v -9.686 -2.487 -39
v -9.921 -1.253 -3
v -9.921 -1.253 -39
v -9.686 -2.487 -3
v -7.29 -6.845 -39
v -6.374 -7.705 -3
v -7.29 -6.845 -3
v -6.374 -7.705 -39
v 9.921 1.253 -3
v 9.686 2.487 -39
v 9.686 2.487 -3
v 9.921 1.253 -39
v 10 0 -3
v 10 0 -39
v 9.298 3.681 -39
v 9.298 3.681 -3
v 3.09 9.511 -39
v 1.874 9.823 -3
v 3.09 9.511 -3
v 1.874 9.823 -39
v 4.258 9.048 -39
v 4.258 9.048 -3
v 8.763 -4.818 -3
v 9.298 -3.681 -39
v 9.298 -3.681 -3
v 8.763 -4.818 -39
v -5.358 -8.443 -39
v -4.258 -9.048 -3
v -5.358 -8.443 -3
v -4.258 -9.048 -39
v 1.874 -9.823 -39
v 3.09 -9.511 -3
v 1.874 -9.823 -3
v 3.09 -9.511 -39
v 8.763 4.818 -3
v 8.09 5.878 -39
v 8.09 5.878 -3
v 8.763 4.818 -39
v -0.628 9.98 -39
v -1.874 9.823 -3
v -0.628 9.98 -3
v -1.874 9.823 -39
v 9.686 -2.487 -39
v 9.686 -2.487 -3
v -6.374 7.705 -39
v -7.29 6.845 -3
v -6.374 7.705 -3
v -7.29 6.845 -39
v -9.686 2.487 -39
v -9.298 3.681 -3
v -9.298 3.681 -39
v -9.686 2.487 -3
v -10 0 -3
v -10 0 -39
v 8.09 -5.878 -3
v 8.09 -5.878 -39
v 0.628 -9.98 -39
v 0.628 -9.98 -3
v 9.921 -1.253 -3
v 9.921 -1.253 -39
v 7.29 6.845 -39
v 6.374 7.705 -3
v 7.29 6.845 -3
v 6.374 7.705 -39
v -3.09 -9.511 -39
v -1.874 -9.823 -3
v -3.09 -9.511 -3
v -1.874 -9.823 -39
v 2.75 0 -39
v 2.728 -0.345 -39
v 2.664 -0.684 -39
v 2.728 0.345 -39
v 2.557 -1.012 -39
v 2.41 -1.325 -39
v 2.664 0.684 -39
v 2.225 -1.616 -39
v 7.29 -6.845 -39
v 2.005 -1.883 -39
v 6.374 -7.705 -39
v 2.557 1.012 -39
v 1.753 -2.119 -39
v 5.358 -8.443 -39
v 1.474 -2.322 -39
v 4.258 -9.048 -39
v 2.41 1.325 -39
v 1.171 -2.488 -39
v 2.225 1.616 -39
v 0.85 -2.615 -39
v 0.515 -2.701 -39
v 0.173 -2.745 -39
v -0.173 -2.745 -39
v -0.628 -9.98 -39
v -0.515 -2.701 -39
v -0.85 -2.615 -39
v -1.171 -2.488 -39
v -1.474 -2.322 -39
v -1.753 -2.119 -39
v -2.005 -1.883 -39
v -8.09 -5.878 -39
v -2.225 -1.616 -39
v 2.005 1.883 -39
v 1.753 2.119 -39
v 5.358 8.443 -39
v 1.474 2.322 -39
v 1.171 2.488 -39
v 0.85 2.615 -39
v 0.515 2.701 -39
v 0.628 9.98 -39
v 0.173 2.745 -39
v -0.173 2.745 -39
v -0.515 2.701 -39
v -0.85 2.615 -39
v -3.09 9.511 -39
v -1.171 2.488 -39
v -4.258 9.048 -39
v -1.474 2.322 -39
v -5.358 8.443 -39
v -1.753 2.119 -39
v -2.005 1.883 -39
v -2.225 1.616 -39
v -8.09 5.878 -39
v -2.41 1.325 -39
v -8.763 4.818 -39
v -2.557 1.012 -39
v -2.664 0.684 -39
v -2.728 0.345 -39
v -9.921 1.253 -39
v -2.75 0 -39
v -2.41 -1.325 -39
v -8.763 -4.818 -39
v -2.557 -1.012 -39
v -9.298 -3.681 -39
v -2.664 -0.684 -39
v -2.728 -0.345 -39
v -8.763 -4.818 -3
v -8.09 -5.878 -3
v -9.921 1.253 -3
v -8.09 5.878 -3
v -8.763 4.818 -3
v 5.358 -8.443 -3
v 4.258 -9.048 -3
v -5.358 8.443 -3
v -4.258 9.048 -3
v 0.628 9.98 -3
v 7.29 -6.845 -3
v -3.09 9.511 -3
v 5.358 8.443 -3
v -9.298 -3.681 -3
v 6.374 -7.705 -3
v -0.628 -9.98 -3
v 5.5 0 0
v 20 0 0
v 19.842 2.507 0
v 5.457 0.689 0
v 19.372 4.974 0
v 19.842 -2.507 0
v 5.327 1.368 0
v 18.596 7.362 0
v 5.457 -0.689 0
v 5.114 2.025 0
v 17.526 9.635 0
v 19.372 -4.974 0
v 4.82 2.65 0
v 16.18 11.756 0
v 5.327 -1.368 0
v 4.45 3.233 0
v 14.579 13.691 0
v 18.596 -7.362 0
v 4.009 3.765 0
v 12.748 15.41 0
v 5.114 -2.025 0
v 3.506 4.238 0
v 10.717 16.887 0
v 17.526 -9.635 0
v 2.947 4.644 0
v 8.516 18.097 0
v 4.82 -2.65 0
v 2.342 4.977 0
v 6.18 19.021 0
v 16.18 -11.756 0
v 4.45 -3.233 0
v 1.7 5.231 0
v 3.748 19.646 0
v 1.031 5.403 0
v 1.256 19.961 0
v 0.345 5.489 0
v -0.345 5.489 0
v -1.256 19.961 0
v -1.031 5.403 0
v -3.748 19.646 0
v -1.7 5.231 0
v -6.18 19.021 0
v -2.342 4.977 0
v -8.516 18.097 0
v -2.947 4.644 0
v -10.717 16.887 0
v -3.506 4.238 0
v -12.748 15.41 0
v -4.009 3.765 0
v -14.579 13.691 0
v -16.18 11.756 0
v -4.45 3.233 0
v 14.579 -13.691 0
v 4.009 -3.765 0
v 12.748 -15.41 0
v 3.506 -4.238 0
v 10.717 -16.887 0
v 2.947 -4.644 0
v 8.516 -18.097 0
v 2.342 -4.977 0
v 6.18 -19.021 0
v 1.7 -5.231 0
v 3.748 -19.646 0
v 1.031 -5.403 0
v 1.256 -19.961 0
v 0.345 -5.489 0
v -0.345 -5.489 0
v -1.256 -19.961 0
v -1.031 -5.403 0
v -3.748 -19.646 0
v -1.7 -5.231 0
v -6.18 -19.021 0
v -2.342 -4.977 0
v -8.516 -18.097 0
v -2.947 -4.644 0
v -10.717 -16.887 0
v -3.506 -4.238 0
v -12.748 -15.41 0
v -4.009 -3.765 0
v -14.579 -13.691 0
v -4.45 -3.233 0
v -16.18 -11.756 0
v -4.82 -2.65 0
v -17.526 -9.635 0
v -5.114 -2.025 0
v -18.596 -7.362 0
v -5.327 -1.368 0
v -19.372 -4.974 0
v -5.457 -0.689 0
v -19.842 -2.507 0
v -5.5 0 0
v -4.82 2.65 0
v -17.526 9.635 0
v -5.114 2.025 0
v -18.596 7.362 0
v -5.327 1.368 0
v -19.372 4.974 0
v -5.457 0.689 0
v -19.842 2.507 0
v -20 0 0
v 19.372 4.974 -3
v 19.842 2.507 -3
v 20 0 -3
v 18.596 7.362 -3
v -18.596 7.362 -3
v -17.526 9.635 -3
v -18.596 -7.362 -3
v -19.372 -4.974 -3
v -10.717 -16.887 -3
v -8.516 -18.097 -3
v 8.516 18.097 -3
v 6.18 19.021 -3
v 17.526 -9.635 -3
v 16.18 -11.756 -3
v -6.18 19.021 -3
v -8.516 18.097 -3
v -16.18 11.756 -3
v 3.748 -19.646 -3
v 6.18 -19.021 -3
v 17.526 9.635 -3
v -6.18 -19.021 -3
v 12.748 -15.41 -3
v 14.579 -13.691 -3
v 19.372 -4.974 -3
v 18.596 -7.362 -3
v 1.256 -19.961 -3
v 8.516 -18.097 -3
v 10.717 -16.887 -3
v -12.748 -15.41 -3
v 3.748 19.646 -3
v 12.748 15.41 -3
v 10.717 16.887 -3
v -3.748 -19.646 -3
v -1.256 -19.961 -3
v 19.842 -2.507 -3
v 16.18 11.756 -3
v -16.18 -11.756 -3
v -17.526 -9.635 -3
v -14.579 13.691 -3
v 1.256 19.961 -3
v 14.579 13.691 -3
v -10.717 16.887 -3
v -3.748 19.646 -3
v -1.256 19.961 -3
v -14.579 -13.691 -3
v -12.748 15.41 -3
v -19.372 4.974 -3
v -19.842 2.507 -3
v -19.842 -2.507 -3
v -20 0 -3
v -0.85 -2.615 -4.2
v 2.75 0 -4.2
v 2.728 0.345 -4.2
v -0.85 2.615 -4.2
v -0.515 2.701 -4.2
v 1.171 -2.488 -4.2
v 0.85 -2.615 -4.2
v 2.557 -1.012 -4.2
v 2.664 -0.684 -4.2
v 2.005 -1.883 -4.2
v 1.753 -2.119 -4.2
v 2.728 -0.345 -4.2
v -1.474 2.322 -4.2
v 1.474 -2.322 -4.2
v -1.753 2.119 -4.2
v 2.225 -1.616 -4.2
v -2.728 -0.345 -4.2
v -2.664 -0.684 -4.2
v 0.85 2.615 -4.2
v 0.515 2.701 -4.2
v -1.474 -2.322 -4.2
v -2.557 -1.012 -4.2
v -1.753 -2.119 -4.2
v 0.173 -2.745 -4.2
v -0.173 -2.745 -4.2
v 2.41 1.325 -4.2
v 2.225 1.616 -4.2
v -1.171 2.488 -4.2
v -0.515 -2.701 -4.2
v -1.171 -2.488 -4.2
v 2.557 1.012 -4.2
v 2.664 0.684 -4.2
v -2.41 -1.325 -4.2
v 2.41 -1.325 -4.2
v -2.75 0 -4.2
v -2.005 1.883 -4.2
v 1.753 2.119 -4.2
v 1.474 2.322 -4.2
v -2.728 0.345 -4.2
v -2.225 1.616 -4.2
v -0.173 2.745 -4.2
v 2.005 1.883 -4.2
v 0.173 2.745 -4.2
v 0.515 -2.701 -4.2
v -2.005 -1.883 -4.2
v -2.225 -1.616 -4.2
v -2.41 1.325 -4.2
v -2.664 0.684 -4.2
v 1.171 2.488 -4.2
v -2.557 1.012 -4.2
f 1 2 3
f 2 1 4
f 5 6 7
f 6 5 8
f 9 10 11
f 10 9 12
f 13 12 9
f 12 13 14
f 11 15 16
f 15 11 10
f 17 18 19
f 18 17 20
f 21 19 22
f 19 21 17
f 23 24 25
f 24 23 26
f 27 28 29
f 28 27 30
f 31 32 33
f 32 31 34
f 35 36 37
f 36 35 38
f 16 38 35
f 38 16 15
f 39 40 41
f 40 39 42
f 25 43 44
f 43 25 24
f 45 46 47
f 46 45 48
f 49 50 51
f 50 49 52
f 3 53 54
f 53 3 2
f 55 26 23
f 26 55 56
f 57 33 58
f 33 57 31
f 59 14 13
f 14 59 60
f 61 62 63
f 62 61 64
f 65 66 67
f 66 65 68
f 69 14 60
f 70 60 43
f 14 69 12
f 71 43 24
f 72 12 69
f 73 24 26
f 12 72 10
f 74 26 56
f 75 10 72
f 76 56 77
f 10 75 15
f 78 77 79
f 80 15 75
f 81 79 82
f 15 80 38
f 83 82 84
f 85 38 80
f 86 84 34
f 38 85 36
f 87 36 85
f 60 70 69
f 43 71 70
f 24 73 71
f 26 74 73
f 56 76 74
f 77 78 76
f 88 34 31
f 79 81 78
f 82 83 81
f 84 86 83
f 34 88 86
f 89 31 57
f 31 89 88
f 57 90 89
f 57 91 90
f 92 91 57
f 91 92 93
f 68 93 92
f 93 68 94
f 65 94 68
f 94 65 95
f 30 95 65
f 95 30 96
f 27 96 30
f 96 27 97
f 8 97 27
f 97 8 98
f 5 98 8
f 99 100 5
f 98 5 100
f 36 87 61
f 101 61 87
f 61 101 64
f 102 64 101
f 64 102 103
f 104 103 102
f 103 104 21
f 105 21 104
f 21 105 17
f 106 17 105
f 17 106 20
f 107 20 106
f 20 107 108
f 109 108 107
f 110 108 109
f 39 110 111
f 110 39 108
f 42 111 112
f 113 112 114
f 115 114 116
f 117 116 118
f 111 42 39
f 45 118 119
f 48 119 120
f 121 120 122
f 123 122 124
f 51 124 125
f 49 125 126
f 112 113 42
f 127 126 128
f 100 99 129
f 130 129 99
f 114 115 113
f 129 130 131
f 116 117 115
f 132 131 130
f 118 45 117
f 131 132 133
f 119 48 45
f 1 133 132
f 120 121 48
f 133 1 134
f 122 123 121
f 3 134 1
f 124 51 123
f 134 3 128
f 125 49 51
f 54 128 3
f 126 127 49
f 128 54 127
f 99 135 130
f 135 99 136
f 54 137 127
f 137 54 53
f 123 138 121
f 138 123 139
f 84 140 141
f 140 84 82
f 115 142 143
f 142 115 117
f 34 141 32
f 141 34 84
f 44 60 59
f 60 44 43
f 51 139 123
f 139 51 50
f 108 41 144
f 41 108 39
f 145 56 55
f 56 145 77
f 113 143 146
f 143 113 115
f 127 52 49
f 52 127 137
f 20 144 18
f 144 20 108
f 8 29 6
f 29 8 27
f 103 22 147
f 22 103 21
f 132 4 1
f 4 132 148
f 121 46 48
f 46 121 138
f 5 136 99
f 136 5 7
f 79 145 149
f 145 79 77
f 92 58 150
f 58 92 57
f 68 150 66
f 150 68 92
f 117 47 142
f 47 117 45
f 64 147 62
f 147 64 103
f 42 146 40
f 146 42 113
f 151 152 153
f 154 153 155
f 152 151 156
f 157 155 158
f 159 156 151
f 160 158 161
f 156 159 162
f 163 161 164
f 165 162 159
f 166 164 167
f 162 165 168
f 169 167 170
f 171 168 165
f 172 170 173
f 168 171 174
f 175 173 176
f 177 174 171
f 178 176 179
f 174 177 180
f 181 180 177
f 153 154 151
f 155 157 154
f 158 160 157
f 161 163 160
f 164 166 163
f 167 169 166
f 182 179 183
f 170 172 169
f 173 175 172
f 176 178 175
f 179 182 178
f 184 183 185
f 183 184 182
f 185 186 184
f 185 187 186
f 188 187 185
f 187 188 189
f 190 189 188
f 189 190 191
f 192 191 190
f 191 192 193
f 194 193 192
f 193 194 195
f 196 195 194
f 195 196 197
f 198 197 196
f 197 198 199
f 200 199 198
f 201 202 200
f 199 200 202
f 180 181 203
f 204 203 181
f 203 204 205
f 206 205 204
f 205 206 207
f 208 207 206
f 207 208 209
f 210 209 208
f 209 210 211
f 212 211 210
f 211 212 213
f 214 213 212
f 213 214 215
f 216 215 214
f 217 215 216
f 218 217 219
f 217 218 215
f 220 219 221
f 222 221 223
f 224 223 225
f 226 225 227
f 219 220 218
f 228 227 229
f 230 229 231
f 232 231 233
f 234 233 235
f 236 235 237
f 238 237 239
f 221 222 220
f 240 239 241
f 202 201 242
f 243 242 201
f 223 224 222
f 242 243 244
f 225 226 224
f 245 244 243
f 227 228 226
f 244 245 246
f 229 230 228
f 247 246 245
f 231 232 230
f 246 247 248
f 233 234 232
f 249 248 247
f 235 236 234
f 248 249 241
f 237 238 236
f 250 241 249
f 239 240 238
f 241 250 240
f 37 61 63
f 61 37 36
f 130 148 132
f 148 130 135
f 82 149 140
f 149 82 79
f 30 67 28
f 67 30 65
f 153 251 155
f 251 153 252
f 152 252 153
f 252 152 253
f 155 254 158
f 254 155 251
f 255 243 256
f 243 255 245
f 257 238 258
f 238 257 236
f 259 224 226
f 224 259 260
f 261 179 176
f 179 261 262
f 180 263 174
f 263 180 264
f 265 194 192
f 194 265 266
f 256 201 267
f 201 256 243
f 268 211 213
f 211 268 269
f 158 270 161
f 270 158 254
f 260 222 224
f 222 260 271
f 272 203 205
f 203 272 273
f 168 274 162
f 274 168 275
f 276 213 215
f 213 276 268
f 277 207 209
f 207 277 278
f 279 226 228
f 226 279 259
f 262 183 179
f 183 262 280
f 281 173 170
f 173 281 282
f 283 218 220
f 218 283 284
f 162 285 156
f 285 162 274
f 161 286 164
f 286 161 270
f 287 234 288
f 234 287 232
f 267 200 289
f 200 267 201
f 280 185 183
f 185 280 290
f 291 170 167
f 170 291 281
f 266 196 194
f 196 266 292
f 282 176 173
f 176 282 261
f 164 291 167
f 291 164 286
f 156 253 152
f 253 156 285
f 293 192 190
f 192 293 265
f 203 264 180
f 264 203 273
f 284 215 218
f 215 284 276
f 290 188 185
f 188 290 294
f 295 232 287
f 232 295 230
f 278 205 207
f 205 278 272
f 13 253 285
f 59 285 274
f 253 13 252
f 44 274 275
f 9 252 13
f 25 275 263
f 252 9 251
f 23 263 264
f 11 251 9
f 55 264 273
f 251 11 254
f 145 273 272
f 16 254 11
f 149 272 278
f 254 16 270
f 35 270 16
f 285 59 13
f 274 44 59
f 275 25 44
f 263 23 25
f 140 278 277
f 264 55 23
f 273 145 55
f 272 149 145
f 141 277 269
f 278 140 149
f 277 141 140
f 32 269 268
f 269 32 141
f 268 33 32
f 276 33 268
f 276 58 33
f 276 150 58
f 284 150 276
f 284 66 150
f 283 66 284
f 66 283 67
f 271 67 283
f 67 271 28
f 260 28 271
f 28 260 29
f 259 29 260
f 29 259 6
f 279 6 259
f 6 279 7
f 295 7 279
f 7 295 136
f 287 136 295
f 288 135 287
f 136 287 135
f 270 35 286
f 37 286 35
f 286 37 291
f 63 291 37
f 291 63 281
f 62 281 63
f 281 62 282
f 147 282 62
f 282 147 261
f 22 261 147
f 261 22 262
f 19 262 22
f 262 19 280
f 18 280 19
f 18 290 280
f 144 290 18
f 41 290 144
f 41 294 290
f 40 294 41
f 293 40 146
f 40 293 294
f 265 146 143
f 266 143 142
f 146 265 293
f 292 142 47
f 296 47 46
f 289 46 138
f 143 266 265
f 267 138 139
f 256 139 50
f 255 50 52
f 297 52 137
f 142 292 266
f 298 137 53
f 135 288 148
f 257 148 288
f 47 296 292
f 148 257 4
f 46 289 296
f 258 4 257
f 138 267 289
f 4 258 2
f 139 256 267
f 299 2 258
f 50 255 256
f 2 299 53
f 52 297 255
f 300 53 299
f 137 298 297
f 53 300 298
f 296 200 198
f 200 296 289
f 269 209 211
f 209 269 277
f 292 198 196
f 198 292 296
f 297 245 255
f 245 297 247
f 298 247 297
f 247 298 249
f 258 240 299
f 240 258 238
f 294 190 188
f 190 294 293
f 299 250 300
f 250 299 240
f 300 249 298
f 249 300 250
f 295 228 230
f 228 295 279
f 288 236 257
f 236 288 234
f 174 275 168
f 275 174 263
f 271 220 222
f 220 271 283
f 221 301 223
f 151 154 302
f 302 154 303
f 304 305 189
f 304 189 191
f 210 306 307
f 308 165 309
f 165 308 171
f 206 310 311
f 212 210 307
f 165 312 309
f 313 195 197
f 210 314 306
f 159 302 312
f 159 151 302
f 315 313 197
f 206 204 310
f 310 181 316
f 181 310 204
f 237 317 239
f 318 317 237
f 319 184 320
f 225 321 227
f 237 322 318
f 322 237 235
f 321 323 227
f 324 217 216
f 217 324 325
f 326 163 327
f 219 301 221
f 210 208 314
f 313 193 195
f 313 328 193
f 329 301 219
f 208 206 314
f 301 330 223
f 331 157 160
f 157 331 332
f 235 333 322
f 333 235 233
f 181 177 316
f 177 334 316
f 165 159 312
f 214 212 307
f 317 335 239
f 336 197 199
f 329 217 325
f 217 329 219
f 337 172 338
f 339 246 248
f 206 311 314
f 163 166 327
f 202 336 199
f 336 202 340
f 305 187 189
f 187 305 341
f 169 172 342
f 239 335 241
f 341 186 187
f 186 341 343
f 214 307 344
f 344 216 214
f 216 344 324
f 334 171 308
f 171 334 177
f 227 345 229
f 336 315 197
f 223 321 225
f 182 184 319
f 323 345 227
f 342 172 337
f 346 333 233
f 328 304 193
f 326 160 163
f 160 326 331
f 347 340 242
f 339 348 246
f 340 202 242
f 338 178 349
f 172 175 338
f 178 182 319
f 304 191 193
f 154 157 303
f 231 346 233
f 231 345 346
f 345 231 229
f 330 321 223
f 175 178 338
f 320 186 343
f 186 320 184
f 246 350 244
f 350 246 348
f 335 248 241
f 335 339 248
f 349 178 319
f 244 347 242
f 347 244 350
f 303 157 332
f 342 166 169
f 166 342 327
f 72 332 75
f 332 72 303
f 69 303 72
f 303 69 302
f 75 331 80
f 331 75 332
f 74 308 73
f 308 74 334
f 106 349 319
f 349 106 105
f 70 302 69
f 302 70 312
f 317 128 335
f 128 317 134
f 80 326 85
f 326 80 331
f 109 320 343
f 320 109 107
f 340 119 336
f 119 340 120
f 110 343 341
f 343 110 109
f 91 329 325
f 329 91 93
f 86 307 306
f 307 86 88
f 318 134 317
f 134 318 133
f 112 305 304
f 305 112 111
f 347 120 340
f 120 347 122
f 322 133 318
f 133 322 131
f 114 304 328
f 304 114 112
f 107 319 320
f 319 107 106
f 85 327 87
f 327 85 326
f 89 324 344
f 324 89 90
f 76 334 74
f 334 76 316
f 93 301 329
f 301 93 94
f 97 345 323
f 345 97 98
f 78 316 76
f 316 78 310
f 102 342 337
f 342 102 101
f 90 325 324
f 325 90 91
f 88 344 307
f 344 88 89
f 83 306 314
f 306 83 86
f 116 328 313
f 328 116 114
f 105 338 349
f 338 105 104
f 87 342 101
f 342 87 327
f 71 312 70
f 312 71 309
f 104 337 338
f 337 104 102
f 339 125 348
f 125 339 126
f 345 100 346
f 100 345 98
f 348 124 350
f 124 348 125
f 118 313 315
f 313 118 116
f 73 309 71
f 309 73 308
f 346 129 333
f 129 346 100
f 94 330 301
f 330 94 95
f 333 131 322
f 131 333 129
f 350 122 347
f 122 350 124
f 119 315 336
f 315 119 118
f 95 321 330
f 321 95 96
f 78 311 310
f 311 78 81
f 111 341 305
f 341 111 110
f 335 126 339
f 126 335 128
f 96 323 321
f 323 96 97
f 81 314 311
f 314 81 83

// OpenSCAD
$fn = 50;


difference() {
	union() {
		translate(v = [0, 0, -39.0000000000]) {
			cylinder(h = 39, r = 10.0000000000);
		}
		translate(v = [0, 0, -3.0000000000]) {
			cylinder(h = 3, r = 20.0000000000);
		}
	}
	union() {
		translate(v = [0, 0, 0]) {
			rotate(a = [0, 0, 0]) {
				difference() {
					union() {
						#translate(v = [0, 0, -39.0000000000]) {
							cylinder(h = 39, r = 2.2500000000);
						}
						#translate(v = [0, 0, -4.2000000000]) {
							cylinder(h = 4.2000000000, r = 10.0000000000, r1 = 2.7500000000, r2 = 5.5000000000);
						}
						#translate(v = [0, 0, -39.0000000000]) {
							cylinder(h = 39, r = 2.7500000000);
						}
						#translate(v = [0, 0, -39.0000000000]) {
							cylinder(h = 39, r = 2.2500000000);
						}
					}
					union();
				}
			}
		}
	}
}
